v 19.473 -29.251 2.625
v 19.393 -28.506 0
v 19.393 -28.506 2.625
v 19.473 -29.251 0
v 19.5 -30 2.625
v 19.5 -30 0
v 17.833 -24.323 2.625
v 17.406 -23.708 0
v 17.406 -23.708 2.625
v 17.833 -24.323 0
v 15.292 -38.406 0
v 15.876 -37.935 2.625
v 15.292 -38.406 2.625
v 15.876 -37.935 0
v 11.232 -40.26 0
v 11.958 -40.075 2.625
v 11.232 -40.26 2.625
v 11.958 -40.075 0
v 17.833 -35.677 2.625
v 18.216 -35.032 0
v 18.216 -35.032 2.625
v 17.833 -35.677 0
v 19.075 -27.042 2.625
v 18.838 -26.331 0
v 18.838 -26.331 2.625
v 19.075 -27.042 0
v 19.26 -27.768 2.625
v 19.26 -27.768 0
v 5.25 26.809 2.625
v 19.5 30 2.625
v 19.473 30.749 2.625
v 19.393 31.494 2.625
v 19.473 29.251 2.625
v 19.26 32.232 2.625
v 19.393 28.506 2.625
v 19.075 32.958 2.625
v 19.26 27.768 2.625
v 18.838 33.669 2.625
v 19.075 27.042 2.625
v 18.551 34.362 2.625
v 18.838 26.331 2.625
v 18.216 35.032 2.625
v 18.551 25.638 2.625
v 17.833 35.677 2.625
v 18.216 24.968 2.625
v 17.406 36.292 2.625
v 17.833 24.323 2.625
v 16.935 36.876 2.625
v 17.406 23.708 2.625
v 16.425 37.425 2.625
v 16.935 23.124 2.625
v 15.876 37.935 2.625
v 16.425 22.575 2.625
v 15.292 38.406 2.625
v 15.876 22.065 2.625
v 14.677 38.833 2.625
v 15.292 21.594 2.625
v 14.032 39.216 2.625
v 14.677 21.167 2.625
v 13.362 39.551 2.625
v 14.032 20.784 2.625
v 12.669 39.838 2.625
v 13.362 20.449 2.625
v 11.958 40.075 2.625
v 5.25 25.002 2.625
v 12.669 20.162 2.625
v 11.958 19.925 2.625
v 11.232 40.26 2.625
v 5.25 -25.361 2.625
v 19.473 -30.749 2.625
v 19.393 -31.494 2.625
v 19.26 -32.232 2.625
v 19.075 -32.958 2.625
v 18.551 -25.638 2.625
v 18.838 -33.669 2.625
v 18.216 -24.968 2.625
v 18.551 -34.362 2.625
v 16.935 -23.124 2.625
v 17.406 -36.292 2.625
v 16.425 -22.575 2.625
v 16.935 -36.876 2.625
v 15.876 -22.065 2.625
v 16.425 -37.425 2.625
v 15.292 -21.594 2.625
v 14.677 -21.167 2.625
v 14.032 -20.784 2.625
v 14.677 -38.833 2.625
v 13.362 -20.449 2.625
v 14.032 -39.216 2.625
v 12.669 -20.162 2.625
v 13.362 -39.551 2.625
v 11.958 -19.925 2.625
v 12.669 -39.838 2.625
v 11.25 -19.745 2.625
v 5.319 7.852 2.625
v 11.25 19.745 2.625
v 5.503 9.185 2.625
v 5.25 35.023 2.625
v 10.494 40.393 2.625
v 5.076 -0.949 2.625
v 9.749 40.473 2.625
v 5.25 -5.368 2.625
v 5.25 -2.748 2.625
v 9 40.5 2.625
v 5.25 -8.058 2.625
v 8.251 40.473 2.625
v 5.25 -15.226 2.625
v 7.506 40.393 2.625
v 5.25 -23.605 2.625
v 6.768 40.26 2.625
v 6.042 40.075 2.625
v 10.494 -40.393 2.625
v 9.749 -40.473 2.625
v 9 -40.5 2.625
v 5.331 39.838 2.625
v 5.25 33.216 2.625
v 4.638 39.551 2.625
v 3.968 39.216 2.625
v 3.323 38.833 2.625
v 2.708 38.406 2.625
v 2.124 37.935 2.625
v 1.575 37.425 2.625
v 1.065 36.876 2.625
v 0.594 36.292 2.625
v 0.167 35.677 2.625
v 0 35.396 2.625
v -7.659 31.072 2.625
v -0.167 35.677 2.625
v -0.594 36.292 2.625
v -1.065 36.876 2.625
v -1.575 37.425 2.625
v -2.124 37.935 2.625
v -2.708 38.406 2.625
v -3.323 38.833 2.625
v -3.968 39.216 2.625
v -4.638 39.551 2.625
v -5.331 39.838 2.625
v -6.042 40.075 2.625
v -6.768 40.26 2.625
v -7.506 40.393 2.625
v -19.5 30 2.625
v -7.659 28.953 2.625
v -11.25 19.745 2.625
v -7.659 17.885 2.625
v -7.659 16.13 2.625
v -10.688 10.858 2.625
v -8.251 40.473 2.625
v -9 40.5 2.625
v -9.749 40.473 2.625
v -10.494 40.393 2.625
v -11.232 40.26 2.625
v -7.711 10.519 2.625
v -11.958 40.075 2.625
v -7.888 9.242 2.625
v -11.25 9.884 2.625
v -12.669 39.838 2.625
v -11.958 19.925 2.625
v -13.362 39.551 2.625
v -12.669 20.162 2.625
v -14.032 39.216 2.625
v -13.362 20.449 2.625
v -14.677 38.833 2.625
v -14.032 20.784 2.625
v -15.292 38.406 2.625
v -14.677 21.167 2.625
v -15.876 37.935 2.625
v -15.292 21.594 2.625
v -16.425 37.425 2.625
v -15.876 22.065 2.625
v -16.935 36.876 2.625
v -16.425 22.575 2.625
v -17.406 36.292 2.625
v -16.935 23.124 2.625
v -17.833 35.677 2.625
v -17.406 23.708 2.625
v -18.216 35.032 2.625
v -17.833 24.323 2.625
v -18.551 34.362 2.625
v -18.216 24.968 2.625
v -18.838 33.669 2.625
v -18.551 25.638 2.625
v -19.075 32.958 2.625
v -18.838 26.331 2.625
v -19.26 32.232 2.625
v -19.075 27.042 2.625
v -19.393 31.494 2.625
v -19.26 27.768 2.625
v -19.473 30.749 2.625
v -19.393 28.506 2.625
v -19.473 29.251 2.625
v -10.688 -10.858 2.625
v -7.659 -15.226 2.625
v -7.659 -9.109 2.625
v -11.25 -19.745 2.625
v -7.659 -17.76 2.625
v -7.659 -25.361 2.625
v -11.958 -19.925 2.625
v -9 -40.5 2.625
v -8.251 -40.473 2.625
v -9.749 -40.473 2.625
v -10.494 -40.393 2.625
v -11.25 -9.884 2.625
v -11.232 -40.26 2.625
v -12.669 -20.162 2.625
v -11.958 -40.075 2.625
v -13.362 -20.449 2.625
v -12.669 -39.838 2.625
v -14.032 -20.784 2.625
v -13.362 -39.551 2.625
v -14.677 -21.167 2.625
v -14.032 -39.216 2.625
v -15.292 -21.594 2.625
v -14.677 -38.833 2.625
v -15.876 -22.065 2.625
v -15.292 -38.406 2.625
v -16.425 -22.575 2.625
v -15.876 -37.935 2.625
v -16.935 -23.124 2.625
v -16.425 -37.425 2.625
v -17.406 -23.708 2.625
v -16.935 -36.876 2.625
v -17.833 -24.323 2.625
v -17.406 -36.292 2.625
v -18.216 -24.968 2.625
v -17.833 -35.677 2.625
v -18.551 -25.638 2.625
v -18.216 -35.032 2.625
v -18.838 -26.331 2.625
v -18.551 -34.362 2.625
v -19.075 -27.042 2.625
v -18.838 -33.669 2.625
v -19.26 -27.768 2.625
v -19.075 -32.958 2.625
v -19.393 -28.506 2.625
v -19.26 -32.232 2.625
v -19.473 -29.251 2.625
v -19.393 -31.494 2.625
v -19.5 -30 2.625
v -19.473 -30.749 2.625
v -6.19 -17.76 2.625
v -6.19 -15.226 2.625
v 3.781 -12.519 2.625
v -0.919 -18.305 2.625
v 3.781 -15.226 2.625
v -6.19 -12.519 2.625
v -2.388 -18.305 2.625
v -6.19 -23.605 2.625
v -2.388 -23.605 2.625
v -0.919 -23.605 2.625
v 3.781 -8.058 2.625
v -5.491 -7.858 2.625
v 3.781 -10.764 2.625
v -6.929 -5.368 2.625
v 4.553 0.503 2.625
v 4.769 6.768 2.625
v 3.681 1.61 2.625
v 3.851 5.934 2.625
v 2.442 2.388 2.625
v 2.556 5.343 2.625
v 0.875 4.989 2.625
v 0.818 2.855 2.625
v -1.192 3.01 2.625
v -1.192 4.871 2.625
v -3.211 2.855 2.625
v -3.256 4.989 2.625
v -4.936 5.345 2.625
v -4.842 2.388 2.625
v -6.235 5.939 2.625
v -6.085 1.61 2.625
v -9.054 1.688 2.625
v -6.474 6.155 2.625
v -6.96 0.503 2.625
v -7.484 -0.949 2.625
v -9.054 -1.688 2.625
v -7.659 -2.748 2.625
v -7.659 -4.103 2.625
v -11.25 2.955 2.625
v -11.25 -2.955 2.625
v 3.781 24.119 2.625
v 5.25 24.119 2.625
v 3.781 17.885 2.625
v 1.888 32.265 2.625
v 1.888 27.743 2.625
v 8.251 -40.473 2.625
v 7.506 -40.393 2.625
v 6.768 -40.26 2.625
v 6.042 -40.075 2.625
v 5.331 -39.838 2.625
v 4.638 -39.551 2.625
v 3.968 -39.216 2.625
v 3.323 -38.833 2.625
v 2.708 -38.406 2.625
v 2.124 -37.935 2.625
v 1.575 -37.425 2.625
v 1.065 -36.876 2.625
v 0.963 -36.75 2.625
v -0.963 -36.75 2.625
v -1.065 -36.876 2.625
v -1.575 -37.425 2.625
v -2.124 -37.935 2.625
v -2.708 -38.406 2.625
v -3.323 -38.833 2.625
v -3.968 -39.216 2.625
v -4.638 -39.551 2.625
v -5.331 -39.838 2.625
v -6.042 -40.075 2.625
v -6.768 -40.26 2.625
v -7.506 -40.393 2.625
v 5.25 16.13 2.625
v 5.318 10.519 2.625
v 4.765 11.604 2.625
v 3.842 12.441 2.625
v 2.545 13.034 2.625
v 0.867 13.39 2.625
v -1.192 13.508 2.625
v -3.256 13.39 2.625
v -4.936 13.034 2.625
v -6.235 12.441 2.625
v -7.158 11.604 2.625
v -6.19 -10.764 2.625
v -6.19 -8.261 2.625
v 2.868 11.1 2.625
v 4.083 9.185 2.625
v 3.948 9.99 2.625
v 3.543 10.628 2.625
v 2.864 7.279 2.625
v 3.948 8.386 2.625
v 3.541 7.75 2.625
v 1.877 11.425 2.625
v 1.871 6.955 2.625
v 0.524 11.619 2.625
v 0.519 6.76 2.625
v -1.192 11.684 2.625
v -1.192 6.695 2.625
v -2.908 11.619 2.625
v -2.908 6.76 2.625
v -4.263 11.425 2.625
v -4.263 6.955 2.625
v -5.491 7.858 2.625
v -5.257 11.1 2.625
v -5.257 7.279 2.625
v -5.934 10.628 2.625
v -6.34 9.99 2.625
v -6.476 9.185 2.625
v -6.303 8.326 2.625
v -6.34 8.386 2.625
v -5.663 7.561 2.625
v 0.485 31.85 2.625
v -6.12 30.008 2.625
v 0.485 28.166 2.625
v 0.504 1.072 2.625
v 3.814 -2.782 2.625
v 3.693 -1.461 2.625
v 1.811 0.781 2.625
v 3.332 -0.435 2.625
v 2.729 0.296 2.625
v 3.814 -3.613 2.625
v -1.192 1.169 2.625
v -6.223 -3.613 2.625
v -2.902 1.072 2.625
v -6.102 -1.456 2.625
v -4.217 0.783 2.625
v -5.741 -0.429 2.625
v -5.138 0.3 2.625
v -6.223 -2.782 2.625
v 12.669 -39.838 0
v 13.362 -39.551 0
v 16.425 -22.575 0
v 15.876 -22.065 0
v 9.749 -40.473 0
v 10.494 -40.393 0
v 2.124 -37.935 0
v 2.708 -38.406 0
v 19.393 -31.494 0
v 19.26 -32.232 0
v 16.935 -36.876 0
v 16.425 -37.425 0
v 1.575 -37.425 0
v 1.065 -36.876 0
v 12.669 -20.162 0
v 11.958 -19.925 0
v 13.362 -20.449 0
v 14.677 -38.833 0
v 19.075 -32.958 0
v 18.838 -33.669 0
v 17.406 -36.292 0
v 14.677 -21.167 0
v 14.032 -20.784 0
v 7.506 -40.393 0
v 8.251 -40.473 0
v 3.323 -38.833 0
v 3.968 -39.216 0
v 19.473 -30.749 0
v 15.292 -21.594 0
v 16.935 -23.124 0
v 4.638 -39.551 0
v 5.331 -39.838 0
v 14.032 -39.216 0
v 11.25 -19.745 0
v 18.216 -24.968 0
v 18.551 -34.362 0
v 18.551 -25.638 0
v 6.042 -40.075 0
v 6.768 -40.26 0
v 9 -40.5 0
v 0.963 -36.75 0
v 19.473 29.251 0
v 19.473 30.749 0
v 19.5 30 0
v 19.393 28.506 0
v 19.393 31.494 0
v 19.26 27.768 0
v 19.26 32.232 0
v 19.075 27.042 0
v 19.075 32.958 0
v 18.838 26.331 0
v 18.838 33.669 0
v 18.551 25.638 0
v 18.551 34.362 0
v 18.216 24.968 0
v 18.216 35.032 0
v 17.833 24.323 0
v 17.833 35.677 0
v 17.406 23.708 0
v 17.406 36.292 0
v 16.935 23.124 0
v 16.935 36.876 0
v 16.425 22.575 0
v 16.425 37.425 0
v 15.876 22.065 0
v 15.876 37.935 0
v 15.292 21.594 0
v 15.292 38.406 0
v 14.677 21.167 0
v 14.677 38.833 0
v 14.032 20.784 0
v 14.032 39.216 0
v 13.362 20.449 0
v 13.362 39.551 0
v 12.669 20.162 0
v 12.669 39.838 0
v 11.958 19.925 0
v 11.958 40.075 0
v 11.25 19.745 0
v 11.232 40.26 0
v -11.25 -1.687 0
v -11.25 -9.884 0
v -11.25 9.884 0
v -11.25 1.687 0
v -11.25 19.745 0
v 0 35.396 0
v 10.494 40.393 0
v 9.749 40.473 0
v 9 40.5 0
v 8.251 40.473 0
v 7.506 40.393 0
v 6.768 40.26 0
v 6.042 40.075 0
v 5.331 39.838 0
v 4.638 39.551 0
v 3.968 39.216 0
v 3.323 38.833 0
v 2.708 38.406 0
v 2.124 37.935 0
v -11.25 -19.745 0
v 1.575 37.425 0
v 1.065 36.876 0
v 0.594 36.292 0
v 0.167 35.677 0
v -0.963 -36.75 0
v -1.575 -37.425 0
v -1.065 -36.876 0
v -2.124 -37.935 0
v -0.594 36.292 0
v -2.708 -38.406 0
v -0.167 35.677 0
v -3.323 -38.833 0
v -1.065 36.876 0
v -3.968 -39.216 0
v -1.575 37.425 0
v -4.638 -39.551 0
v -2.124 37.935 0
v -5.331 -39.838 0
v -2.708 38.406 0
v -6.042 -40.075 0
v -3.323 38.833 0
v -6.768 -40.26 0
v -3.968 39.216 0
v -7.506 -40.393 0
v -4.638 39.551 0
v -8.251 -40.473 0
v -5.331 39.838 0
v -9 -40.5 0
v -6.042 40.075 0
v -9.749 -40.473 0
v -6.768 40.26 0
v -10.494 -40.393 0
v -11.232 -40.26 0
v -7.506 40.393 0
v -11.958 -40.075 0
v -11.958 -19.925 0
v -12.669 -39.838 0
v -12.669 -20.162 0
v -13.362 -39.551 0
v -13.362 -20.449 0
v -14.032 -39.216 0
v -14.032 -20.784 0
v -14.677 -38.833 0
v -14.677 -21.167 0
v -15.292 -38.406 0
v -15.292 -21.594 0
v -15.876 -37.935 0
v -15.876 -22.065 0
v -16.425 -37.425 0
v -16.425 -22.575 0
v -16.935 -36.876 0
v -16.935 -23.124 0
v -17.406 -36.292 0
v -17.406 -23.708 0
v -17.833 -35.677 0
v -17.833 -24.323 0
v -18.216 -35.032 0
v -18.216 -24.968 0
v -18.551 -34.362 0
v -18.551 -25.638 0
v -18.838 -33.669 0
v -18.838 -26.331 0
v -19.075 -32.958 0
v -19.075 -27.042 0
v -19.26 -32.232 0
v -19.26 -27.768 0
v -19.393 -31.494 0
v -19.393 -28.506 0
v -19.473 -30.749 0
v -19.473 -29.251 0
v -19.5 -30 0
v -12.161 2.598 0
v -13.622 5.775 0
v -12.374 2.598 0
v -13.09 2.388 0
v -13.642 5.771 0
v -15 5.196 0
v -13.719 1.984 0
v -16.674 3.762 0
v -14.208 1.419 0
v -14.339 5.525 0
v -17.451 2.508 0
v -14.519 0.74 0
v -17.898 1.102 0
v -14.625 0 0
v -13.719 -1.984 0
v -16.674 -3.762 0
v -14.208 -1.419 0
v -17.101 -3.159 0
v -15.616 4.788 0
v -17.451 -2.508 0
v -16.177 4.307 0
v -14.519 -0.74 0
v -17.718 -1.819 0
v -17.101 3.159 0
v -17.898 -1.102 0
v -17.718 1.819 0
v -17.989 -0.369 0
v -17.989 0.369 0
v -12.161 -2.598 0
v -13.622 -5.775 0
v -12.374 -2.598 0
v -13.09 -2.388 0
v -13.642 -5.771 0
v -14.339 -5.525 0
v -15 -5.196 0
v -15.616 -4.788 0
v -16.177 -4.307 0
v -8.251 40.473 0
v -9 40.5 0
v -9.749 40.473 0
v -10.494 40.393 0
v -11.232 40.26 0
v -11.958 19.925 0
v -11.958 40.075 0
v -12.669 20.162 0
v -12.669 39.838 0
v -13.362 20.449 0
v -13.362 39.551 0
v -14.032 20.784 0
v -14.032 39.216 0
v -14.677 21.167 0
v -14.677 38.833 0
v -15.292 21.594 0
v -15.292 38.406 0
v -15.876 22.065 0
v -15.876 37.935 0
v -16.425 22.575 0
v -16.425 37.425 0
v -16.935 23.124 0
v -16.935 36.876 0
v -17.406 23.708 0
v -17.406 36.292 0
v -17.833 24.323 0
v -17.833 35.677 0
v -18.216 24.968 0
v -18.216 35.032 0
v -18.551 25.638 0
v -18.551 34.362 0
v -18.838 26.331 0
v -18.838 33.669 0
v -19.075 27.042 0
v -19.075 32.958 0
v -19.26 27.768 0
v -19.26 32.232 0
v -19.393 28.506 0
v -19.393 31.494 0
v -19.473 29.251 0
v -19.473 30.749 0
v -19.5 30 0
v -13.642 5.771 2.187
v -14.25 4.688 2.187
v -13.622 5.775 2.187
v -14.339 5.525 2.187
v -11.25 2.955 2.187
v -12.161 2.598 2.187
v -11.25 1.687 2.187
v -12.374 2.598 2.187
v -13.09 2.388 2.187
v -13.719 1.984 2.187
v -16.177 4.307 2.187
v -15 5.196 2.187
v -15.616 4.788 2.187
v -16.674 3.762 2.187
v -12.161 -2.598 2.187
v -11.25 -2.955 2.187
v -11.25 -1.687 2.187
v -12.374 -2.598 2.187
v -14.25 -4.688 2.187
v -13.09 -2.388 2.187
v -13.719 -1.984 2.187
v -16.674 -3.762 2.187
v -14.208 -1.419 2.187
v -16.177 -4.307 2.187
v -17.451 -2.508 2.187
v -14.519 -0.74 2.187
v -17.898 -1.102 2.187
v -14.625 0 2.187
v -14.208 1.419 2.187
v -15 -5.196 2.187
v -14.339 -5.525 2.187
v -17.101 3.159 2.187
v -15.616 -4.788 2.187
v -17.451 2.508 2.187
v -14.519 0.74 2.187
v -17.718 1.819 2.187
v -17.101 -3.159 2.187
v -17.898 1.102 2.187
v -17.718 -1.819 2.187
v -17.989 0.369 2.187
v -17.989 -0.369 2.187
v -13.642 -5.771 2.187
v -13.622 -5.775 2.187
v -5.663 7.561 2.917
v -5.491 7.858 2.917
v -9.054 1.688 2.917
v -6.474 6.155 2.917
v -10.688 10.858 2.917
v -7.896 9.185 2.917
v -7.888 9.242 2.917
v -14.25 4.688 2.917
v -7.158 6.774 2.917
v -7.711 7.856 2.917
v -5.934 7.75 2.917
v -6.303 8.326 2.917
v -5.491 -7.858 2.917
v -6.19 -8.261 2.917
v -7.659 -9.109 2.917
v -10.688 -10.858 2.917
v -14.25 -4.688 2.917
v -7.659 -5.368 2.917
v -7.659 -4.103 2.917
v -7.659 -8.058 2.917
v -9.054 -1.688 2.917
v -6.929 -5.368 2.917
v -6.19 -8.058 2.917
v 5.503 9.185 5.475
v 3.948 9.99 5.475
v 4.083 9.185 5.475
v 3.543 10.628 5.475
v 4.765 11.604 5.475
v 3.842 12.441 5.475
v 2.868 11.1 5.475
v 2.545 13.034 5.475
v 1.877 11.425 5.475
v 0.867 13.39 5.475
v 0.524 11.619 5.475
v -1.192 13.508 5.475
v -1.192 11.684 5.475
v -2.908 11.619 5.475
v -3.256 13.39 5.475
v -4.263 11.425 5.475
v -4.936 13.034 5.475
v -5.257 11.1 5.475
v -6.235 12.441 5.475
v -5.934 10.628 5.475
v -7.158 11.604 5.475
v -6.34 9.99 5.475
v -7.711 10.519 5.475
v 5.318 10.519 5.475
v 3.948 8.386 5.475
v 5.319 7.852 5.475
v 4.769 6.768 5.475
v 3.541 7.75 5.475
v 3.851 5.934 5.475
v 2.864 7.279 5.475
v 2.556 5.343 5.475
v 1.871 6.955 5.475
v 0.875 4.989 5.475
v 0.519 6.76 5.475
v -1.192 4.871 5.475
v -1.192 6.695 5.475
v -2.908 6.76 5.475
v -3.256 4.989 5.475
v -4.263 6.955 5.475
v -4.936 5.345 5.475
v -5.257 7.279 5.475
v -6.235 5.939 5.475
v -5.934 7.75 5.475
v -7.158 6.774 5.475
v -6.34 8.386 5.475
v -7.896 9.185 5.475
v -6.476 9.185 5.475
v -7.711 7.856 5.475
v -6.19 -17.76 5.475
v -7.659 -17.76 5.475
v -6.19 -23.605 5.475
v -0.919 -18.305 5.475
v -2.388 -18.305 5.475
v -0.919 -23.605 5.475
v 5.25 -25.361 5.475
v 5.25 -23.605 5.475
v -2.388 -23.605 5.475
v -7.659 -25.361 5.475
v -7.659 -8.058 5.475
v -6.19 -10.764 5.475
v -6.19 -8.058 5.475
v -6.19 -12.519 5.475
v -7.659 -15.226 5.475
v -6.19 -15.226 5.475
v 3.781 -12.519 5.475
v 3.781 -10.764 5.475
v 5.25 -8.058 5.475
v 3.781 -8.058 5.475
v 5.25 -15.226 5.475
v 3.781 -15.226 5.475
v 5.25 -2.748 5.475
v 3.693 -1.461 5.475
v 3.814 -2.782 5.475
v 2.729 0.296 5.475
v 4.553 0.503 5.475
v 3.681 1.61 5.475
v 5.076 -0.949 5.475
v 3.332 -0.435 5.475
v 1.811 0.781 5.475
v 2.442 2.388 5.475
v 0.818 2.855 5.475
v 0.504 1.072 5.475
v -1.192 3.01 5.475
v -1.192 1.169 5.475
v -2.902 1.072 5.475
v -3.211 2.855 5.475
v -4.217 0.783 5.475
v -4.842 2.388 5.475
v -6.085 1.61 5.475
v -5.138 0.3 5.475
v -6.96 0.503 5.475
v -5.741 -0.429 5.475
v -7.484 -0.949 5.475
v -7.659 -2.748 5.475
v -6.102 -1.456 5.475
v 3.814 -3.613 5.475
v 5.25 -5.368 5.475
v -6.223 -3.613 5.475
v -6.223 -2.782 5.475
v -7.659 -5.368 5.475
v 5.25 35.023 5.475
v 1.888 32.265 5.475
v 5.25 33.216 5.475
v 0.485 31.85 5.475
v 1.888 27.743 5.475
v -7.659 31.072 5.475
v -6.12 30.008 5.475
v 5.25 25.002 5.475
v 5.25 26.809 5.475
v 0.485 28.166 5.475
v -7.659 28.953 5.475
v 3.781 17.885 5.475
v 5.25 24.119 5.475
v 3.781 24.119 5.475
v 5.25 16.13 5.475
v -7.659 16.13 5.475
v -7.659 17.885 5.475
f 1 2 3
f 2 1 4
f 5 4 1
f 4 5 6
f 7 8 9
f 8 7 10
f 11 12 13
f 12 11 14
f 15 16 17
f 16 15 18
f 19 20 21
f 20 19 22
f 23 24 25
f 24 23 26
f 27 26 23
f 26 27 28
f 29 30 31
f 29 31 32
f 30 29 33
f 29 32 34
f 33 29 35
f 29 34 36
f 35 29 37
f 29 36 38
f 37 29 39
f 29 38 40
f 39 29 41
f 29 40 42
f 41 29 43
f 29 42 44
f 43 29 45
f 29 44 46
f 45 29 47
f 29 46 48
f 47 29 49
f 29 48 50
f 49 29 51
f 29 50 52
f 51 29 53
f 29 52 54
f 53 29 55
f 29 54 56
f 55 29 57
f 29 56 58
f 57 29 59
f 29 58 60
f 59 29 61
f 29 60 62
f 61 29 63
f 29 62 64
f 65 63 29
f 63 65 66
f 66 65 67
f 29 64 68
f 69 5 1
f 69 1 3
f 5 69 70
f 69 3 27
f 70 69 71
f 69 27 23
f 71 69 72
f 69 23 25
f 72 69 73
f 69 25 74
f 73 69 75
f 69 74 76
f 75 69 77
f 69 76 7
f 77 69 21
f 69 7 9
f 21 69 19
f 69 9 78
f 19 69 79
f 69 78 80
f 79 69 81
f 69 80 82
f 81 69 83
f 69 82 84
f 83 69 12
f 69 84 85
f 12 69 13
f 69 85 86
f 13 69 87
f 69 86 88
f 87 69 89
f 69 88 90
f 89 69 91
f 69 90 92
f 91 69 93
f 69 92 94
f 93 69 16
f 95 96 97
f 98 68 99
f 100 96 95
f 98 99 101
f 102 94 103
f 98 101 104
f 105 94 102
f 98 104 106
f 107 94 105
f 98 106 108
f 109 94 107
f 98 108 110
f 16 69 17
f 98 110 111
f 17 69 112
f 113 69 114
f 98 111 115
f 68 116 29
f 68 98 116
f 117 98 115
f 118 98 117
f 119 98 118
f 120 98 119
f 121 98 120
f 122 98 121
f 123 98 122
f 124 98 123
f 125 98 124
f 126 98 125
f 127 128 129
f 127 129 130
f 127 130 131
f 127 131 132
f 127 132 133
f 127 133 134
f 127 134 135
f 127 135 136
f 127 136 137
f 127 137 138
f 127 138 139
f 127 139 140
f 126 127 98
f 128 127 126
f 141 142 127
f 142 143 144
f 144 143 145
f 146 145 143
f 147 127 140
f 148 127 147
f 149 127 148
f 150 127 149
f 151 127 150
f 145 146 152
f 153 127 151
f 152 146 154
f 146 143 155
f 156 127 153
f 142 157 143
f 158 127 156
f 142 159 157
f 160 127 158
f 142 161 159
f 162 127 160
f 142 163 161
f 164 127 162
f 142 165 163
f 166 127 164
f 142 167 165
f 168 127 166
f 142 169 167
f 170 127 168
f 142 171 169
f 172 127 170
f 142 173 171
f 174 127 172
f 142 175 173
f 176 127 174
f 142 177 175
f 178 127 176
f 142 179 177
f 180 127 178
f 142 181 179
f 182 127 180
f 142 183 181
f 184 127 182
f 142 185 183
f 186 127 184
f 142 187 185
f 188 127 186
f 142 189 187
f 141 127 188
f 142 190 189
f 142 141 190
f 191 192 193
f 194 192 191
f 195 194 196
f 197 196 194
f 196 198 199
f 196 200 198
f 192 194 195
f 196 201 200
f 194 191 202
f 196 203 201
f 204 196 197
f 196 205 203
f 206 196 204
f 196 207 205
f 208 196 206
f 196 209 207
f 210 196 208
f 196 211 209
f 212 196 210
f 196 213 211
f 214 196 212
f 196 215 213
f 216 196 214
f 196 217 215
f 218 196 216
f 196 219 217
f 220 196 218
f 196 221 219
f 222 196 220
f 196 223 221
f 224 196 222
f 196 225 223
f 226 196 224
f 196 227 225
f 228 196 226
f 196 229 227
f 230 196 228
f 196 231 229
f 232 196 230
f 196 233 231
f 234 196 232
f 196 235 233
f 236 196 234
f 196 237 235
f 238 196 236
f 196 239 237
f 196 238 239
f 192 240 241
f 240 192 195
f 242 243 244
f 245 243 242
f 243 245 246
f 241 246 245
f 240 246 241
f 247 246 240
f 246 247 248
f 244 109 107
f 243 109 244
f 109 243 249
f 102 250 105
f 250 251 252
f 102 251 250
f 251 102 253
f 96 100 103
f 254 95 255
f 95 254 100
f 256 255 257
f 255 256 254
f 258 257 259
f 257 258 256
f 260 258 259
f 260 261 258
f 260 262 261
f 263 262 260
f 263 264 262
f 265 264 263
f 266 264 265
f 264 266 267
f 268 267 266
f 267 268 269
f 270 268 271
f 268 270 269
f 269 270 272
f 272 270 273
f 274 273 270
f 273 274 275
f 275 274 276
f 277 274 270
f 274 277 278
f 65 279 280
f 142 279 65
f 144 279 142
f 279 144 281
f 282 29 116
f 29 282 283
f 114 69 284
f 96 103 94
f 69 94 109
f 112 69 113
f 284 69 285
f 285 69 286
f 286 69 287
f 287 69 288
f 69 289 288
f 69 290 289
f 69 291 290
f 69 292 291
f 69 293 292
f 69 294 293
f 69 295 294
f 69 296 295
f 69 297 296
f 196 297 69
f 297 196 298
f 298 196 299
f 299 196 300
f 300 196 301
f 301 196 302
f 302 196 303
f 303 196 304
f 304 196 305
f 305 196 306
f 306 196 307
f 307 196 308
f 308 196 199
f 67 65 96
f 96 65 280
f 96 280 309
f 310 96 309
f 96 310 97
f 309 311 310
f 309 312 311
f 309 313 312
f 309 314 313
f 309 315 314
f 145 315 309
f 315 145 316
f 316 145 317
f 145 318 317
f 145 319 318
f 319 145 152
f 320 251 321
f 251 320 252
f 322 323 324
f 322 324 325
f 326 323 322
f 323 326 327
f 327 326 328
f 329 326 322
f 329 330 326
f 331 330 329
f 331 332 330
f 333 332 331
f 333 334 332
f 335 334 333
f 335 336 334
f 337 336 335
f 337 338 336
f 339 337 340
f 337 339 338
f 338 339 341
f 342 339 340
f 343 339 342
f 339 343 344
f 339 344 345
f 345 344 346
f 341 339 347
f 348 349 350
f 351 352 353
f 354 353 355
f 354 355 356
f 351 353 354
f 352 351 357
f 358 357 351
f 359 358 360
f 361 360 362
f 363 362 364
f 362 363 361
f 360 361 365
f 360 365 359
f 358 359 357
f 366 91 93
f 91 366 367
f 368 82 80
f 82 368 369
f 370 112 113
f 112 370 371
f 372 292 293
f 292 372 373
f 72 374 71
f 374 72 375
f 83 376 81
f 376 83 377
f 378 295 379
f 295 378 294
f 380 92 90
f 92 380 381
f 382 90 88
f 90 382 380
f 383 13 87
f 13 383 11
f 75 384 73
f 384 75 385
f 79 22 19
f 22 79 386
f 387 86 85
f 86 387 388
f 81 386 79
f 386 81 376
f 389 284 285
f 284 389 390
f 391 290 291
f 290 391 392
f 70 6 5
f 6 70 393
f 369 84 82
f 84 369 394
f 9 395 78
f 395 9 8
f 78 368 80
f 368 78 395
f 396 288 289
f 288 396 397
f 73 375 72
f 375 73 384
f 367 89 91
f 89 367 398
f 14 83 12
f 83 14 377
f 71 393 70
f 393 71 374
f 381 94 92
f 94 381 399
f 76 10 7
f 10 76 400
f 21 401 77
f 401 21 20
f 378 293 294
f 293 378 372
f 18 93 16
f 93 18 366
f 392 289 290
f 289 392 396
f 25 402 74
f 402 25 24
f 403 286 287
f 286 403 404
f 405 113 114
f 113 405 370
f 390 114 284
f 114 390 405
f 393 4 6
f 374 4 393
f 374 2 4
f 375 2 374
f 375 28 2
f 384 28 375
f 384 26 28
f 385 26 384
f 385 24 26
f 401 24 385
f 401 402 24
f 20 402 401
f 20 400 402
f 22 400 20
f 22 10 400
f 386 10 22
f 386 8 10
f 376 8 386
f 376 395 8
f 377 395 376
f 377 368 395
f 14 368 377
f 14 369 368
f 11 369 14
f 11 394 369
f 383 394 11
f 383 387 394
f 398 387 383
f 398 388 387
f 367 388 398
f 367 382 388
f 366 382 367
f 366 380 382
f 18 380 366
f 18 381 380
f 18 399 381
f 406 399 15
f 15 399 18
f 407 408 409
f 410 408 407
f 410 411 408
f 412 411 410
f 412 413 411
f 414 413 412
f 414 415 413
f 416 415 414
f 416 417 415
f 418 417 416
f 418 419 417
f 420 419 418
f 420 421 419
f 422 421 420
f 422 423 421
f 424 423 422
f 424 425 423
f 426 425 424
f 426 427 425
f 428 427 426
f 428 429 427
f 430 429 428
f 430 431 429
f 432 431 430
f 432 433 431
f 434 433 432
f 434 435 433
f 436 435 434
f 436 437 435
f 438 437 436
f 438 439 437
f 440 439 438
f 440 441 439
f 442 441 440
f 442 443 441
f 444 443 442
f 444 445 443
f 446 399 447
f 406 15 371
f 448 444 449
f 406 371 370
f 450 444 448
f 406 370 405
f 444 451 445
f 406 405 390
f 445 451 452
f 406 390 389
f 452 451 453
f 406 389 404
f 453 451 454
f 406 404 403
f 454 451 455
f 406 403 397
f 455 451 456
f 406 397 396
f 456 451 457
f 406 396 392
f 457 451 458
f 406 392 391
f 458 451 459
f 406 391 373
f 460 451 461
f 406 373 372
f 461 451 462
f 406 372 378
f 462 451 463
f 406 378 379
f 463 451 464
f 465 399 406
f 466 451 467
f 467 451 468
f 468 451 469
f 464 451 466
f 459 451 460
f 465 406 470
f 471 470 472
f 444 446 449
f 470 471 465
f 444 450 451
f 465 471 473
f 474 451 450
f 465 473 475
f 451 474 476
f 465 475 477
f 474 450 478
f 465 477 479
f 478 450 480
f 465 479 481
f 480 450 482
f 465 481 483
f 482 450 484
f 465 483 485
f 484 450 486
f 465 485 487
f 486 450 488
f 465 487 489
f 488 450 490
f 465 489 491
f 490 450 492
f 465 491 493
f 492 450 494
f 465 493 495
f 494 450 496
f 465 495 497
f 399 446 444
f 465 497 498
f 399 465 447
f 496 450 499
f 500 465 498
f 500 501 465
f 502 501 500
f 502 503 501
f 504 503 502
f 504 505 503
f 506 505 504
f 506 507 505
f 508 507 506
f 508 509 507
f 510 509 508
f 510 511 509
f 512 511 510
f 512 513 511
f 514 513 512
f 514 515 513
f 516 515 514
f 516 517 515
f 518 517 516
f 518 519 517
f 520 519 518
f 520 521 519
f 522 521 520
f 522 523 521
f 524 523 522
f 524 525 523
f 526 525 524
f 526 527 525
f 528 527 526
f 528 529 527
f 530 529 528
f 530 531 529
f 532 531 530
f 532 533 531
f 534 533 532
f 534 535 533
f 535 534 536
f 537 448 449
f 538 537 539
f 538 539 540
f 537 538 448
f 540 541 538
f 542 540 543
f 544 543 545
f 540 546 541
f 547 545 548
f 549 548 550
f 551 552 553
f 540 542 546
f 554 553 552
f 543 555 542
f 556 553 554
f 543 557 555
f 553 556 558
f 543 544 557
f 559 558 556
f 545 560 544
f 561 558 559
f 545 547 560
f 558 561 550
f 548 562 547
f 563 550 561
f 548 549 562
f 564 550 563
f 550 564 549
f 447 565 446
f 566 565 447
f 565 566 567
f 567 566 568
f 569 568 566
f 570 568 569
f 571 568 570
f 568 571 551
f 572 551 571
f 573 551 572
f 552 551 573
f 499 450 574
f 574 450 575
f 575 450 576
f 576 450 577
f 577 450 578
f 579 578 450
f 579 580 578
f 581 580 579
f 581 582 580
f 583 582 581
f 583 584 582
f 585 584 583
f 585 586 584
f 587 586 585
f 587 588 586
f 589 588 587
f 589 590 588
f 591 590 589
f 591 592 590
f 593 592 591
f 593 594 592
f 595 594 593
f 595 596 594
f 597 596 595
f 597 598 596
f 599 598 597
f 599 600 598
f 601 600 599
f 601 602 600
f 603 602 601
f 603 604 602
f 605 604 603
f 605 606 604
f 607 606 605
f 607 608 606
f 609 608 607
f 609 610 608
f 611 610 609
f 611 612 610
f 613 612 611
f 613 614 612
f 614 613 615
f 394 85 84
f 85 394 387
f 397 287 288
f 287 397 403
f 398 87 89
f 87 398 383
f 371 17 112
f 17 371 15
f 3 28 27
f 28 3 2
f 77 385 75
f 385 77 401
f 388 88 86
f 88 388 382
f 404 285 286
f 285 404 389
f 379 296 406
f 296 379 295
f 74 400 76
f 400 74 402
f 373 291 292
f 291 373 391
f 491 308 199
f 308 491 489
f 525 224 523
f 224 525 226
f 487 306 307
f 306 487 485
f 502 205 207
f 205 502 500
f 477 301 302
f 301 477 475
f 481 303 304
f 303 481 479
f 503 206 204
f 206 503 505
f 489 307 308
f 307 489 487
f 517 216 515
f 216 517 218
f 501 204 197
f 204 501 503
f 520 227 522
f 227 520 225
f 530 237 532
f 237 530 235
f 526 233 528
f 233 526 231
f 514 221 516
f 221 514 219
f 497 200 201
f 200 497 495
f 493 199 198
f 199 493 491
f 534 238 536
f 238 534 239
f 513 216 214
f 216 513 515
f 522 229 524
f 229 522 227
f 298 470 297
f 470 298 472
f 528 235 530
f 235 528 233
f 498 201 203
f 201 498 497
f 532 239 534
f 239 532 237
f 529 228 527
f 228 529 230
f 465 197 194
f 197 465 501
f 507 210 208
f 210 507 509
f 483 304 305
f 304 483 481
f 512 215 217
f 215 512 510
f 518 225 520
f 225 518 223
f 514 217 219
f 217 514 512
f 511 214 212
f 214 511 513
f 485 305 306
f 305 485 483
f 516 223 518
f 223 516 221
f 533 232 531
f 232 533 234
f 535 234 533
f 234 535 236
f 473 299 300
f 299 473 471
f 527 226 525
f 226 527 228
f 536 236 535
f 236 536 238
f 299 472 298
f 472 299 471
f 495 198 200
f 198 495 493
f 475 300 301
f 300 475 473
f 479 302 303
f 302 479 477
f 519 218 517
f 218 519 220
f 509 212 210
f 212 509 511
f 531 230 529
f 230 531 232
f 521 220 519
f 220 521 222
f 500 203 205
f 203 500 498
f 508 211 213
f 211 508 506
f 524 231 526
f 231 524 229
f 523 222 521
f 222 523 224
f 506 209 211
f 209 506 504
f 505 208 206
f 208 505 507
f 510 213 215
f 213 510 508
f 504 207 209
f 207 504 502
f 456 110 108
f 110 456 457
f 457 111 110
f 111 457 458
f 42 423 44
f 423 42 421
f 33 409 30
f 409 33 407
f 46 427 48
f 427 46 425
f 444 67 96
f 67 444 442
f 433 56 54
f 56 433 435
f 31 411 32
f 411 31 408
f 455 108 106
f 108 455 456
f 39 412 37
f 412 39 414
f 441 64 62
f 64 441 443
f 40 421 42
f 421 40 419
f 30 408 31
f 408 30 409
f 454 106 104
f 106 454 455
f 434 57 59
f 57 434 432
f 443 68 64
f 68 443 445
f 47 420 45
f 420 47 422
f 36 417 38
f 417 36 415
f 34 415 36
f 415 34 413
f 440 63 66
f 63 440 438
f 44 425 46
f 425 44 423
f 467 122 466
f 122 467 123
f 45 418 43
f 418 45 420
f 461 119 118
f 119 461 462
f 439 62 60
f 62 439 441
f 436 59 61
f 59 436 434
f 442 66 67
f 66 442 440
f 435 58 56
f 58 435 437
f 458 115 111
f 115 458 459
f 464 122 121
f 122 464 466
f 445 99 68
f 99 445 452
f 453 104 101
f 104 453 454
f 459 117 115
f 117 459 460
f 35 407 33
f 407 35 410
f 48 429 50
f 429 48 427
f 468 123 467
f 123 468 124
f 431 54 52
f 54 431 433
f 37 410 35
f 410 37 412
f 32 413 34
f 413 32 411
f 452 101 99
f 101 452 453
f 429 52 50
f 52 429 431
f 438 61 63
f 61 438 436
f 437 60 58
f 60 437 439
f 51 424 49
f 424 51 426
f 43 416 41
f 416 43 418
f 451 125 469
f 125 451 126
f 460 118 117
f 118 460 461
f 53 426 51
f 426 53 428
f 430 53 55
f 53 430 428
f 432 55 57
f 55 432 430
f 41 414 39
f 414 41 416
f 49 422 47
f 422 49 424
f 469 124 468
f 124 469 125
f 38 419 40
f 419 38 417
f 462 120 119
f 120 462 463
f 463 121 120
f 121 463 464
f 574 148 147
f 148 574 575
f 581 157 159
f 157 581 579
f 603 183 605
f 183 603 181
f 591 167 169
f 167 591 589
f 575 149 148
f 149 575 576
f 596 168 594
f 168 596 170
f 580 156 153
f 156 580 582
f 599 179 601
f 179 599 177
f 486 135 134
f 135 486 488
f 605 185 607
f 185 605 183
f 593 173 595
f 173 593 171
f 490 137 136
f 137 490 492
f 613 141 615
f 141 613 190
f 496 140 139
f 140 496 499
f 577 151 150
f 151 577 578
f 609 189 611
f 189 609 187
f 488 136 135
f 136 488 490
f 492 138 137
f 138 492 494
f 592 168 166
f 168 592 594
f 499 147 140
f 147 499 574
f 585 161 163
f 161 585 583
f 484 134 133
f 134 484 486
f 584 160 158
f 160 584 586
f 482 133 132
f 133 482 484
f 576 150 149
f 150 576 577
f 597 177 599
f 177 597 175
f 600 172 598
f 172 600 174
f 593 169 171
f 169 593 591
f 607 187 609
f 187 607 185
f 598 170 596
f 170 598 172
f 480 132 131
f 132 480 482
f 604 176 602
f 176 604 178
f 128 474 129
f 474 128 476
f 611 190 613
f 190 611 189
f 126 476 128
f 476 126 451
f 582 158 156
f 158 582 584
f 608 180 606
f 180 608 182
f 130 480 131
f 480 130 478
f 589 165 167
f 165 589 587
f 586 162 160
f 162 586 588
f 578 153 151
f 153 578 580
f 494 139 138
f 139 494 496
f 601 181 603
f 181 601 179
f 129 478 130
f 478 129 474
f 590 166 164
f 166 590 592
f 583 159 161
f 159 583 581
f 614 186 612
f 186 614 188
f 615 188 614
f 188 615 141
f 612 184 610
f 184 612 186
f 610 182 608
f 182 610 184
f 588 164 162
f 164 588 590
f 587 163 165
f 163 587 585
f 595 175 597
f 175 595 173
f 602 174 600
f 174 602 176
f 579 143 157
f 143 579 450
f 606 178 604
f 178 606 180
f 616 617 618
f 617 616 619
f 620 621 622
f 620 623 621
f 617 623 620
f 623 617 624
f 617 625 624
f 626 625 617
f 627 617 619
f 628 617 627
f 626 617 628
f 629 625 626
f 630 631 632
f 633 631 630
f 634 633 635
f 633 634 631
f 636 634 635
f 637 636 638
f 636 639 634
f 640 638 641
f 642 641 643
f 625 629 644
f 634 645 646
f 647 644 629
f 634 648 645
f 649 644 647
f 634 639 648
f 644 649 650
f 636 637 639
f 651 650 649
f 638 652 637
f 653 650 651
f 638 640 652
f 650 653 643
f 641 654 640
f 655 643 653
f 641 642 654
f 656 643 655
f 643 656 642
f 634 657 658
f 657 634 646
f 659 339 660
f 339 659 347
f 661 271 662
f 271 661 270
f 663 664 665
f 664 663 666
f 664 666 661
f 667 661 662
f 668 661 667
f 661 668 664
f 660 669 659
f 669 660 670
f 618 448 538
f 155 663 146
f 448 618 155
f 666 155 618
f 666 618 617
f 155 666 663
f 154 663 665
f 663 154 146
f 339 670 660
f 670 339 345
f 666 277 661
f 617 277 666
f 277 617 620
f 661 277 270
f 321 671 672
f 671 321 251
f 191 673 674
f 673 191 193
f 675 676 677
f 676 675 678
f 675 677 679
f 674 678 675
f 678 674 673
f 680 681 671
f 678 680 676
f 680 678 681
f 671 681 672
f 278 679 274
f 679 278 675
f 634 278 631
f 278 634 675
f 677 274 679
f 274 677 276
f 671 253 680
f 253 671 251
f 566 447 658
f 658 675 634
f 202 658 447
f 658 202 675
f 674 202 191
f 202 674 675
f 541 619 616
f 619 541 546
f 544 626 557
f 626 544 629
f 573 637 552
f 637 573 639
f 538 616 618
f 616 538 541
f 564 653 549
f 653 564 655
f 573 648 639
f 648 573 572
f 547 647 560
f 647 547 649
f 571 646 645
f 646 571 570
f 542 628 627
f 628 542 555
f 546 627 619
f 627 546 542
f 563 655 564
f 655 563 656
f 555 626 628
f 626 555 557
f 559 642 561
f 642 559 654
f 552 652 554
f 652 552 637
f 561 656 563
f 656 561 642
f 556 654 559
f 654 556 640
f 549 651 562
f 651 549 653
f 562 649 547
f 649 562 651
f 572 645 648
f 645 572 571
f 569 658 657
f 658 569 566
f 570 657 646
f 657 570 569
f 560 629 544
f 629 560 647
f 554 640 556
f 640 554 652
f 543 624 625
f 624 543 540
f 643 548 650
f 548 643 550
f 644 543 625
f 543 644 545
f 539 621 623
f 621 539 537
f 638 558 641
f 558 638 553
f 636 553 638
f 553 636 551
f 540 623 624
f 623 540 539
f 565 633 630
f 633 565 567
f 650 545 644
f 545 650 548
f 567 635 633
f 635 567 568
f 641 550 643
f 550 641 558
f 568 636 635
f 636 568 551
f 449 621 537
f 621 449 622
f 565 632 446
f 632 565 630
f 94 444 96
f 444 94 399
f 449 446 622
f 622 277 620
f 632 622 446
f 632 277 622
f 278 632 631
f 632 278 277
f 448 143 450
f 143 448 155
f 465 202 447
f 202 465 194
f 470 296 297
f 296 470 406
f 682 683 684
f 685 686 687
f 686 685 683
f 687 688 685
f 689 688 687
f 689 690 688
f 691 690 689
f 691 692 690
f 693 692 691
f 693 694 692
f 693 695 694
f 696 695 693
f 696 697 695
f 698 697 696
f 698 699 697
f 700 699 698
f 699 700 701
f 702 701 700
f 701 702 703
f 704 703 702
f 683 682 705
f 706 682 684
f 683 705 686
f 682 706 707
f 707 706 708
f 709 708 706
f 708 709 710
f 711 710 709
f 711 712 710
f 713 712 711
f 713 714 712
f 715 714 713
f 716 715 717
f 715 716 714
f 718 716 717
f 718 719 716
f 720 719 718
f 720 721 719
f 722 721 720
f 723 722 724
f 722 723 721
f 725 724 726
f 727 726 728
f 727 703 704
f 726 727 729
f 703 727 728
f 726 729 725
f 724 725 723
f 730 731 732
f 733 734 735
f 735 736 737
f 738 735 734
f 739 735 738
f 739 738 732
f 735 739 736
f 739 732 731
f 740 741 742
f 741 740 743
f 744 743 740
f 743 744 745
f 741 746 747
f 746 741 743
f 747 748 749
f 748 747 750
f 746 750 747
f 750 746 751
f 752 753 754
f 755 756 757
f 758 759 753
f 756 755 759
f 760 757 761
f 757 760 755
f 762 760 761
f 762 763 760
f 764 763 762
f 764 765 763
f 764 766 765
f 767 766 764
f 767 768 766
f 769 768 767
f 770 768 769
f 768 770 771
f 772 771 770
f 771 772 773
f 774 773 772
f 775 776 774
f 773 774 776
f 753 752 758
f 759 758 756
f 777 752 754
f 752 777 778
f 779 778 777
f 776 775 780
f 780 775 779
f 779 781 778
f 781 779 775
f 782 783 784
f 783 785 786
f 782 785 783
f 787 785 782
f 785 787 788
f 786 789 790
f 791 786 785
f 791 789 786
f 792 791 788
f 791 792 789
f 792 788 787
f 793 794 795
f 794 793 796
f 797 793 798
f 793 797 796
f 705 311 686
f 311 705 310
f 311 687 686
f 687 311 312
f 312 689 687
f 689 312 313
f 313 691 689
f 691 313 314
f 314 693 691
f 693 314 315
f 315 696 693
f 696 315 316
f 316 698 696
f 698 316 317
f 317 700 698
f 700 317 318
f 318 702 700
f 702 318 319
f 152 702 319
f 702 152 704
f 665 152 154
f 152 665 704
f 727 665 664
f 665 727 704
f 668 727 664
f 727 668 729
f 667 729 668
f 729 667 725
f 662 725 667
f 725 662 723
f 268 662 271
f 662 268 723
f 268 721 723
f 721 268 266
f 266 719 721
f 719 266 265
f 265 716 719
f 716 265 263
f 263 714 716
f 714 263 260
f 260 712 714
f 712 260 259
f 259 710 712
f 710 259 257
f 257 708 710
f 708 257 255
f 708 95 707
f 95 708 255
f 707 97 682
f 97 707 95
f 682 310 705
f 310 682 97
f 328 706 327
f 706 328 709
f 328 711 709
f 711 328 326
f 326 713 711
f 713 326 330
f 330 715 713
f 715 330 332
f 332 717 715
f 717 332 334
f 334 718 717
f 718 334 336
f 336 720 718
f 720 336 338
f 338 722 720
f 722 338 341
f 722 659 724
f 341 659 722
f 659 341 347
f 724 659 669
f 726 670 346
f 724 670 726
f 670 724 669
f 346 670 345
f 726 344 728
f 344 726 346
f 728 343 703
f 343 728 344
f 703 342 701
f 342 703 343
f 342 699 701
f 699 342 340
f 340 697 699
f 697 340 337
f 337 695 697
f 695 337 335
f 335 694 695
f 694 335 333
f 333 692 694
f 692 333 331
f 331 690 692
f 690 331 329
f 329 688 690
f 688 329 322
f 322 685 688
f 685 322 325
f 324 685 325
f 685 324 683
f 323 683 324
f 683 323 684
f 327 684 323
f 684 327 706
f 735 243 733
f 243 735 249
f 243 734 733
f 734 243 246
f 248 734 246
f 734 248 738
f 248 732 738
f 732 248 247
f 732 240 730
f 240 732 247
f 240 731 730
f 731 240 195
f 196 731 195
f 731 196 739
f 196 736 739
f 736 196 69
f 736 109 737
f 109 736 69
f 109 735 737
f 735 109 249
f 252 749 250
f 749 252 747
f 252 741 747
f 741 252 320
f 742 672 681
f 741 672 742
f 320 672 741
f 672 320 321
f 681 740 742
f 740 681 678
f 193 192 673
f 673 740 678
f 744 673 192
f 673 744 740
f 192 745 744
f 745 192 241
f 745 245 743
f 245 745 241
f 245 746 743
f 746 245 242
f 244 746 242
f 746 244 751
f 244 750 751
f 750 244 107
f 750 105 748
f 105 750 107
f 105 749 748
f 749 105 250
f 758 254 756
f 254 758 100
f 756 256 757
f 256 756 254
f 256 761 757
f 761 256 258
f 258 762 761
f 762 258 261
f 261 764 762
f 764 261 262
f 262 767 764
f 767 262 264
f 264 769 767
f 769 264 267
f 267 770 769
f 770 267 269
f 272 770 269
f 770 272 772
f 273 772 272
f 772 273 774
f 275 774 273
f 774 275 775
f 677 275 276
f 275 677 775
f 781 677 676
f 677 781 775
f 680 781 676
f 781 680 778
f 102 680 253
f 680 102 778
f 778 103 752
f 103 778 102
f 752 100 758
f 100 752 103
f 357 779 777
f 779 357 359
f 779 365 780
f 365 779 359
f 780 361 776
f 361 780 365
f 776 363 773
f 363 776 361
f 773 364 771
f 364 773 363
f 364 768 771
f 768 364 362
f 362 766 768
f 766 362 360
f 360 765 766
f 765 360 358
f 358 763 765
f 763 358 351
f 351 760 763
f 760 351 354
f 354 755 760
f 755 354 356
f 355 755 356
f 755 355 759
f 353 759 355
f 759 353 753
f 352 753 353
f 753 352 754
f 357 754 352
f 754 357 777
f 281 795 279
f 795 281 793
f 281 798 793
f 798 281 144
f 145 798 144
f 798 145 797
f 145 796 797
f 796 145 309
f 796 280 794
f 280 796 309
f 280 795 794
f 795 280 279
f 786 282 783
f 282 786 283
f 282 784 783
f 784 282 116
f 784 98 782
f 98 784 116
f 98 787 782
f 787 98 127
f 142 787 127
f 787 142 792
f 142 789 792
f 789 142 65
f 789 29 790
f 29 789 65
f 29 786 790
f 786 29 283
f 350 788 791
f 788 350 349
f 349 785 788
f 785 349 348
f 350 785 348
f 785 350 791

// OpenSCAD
$fa=1;
$fs=1;
bone_height = 3.5;//set this to how thick you want the tag
pet_name="FIDOLA";
//phone_number="123.555.1212";
font_face="Consolas";
font_thickness=3.8;

tag_attachment_outer_diameter = 8;
tag_attachment_inner_diameter = 3.5;
tag_attachment_width = (tag_attachment_outer_diameter - tag_attachment_inner_diameter);
tag_attachment_height = bone_height*5/6;
tag_attachment_flare_width = 8;

module t(t){
 translate([-1,(-len(t)*4.0),bone_height])
   rotate([0, 0, 90])
    linear_extrude(height = font_thickness)
      text(t, 17, font = str(font_face), $fn = 16);
}
//bone
//left side of bone

scale([1,1,1]*0.75) {
translate([-12,-40,0])
{
    translate([24,0,0]) cylinder(h=bone_height, r=14);
    cylinder(h=bone_height, r=14);
};
//right side of bone
translate([-12,40,0])
{
    translate([24,0,0]) cylinder(h=bone_height, r=14);
    cylinder(h=bone_height, r=14);
};

//center of bone
translate([-15,-49,0]) cube([30,90,bone_height]);

translate([8,-12.5,0]) t(pet_name);
// translate([12,0,0]) t(phone_number);

//tag attachment
difference(){
    union() {
        translate([-16,0,0]) {

            cylinder(r=tag_attachment_outer_diameter, h=tag_attachment_height);

            // add flares at attachment point for more area
            translate([-3,tag_attachment_outer_diameter/2 + tag_attachment_width/2 ,0])
            {
                rotate([0,0,-45]) {
                    cube([tag_attachment_flare_width , tag_attachment_flare_width ,tag_attachment_height]);
                }
                rotate([0,0, -30 ]) {
                    cube([tag_attachment_flare_width , tag_attachment_flare_width + 1.5 ,tag_attachment_height * 4/3]);
                }

            };
           translate([-3,-(tag_attachment_outer_diameter/2 + tag_attachment_width/2) ,0])
            {
                rotate([0,0,-45]) {
                    cube([tag_attachment_flare_width , tag_attachment_flare_width ,tag_attachment_height]);
                }
                rotate([0,0,-60]) {
                    cube([tag_attachment_flare_width + 1.5 , tag_attachment_flare_width ,tag_attachment_height * 4/3]);
                }

            };
        }
    }
    //prevents non-manifold
    translate([-16,0,-1]) cylinder(r=tag_attachment_inner_diameter, h=((bone_height*2/3)+2));
}


translate([-16,0,0]) {

  // add flares at attachment point for more area
  translate([-3,tag_attachment_outer_diameter/2 + tag_attachment_width/2 ,0])
  {
    rotate([0,0,-45]) {
      cube([tag_attachment_flare_width , tag_attachment_flare_width ,tag_attachment_height]);
    }
  };
  translate([-3,-(tag_attachment_outer_diameter/2 + tag_attachment_width/2) ,0])
  {
    rotate([0,0,-45]) {
      cube([tag_attachment_flare_width , tag_attachment_flare_width ,tag_attachment_height]);
    }
  };
}


}
